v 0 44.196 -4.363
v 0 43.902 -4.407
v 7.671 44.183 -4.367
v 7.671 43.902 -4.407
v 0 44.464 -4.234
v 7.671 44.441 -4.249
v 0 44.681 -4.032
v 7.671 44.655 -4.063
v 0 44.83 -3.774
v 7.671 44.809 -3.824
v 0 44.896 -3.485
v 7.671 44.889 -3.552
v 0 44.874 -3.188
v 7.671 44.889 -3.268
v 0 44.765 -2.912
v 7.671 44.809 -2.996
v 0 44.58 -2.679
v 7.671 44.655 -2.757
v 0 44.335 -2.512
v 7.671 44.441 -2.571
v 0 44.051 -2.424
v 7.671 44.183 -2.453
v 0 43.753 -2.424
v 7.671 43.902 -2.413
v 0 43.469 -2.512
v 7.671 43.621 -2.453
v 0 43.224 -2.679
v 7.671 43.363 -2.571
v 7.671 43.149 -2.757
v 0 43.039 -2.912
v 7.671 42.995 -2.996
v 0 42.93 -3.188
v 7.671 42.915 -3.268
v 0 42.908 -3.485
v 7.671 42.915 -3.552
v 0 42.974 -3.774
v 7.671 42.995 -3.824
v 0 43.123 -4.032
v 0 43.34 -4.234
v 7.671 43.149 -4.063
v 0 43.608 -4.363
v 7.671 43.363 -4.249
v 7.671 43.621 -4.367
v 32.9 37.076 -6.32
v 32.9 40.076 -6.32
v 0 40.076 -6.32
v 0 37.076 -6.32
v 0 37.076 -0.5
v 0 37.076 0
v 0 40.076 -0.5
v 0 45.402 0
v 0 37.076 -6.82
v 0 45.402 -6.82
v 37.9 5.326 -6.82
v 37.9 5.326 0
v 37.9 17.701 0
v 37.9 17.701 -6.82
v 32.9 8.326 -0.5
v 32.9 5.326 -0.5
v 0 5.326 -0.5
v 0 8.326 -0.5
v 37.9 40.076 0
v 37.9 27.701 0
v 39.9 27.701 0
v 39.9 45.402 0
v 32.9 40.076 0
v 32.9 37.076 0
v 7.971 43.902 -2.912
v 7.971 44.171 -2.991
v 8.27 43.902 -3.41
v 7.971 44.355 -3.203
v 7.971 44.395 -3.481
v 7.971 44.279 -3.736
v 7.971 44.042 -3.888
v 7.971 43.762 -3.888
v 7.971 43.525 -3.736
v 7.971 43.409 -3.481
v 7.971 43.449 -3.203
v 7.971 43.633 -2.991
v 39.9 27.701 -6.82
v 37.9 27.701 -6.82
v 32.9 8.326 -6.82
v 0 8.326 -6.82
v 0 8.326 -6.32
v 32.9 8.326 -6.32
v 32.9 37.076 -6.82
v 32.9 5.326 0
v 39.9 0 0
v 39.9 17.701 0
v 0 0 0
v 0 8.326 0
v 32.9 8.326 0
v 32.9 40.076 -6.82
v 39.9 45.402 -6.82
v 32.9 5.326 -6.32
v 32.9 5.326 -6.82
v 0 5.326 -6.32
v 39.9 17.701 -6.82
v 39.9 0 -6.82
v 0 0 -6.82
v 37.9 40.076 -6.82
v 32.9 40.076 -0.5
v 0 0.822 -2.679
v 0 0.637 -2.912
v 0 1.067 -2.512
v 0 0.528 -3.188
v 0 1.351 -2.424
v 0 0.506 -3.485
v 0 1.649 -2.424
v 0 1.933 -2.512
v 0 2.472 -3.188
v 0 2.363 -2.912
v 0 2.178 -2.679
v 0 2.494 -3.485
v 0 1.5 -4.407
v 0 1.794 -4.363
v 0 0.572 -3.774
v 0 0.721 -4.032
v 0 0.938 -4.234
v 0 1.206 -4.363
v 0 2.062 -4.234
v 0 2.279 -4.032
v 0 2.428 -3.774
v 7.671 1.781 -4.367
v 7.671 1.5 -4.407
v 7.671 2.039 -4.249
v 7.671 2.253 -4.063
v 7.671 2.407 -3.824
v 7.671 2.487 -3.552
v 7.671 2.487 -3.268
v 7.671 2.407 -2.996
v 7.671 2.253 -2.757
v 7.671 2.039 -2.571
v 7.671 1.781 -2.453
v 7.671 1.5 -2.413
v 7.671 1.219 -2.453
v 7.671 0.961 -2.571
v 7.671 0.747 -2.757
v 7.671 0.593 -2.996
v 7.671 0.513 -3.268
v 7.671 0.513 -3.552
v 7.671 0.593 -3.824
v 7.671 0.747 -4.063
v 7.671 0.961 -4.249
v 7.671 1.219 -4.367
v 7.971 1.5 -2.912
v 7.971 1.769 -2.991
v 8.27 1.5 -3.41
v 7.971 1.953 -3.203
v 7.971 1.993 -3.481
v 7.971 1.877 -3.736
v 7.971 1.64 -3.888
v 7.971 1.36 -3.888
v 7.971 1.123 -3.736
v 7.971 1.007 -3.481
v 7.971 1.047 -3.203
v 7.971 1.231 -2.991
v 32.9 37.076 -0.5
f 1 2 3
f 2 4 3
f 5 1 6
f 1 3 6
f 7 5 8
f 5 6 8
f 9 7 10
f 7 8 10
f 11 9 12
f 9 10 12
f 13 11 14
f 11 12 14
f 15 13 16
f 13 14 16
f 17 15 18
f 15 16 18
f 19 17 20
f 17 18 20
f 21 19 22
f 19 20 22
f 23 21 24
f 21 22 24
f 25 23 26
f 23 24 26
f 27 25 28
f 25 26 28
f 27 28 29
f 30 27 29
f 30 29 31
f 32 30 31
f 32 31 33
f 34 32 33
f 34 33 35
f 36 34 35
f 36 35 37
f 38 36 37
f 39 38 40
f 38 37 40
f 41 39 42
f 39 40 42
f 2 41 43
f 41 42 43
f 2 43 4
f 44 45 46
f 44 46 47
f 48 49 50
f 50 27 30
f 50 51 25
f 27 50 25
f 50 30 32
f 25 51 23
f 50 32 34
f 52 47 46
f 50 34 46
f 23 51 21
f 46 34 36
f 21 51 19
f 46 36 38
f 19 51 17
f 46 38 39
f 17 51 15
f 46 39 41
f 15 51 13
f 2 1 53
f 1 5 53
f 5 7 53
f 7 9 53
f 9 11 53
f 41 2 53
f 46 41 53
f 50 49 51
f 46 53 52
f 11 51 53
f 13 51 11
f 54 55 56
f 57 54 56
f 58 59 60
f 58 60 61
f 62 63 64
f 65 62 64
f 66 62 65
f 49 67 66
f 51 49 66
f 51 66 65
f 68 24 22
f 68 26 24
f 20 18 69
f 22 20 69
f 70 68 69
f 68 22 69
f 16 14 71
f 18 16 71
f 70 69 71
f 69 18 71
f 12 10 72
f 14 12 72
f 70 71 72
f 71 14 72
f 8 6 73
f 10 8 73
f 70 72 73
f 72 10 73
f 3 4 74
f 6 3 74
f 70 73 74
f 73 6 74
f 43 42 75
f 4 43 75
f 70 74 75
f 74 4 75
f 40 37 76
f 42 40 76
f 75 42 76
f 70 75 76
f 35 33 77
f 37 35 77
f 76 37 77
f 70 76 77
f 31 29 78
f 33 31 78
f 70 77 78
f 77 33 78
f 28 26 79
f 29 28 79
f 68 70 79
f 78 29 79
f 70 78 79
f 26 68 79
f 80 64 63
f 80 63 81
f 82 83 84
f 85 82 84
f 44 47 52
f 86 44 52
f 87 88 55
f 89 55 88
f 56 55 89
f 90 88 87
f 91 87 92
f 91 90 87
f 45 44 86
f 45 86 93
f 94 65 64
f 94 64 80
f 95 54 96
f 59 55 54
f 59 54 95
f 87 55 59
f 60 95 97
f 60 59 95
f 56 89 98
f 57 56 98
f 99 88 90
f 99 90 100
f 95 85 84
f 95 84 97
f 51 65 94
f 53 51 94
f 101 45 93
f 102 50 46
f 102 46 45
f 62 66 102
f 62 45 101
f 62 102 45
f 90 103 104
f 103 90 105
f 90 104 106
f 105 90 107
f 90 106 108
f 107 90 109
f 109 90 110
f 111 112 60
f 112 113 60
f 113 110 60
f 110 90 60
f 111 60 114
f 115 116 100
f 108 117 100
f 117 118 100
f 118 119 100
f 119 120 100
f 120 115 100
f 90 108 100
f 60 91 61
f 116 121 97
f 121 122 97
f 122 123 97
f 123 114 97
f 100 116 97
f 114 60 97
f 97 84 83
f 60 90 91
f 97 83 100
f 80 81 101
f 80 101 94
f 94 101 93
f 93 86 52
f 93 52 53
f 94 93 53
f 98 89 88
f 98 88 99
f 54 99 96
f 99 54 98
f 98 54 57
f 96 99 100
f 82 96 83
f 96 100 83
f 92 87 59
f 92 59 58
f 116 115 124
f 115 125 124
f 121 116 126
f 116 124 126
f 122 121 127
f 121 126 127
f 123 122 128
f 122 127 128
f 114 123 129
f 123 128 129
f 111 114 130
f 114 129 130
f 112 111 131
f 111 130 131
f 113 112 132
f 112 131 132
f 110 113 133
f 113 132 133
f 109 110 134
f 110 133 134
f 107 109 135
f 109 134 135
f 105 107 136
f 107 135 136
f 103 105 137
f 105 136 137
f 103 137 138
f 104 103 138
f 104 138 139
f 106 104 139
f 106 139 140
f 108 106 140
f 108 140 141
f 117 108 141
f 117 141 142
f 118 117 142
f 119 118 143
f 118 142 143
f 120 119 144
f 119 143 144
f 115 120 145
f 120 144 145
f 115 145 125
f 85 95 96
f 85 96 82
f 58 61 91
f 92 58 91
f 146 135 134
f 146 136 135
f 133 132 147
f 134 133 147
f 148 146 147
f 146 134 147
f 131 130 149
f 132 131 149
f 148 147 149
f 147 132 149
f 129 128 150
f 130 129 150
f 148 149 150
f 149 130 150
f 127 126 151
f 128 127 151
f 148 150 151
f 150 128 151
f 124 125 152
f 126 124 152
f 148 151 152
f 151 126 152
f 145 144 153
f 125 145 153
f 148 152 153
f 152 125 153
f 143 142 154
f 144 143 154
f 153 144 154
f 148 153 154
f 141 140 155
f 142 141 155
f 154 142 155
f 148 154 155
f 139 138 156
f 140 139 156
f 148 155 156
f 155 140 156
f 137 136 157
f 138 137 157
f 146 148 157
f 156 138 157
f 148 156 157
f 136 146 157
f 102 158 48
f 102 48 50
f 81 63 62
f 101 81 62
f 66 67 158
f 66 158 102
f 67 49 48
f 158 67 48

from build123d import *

# Parameters (mm, degrees)
SKETCH1_W                 = 6.82
SKETCH1_H                 = 45.402
BOSS_EXTRUDE1_DEPTH       = 39.9
CUT_EXTRUDE1_DEPTH        = 35.9
CUT_EXTRUDE2_DEPTH        = 2
CUT_EXTRUDE4_DEPTH        = 7.82
F_3_48_TAPPED_HOLE1_D     = 1.9939
F_3_48_TAPPED_HOLE1_DEPTH = 7.671
F_3_48_TAPPED_HOLE1_TIP   = 0.599027994
CUT_EXTRUDE3_REACH        = 41.9
SKETCH6_W                 = 6.82
SKETCH6_H                 = 10


with BuildPart() as part:
    # Sketch1 → Boss-Extrude1 (new body)
    with BuildSketch(Plane(origin=(0, 0, 0), x_dir=(0, 0, -1), z_dir=(1, 0, 0))):
        with Locations((3.41, 22.701)):
            Rectangle(SKETCH1_W, SKETCH1_H)
    extrude(amount=BOSS_EXTRUDE1_DEPTH)

    # Sketch2 → Cut-Extrude1 (cut)
    with BuildSketch(Plane.ZY):
        Polygon((-6.32, 5.326), (-0.5, 5.326), (-0.5, 8.326), (0, 8.326), (0, 37.076), (-0.5, 37.076), (-0.5, 40.076), (-6.32, 40.076), (-6.32, 37.076), (-6.82, 37.076), (-6.82, 22.701), (-6.82, 8.326), (-6.32, 8.326), align=None)
    extrude(amount=-CUT_EXTRUDE1_DEPTH, mode=Mode.SUBTRACT)

    # Sketch3 → Cut-Extrude2 (cut)
    with BuildSketch(Plane.ZY.offset(-35.9)):
        Polygon((-6.32, 40.076), (-6.32, 37.076), (-6.82, 37.076), (-6.82, 8.326), (-6.32, 8.326), (-6.32, 5.326), (-0.5, 5.326), (-0.5, 8.326), (0, 8.326), (0, 37.076), (-0.5, 37.076), (-0.5, 40.076), align=None)
    extrude(amount=-CUT_EXTRUDE2_DEPTH, mode=Mode.SUBTRACT)

    # Sketch7 → Cut-Extrude4 (cut, through all)
    with BuildSketch(Plane.XY):
        Polygon((37.9, 37.076), (37.9, 8.326), (37.9, 5.326), (32.9, 5.326), (32.9, 40.076), (37.9, 40.076), align=None)
    extrude(amount=-CUT_EXTRUDE4_DEPTH, mode=Mode.SUBTRACT)

    # #3-48 Tapped Hole1
    with Locations(Plane.ZY):
        with Locations((-3.41, 1.5), (-3.41, 43.902)):
            Hole(F_3_48_TAPPED_HOLE1_D / 2, depth=F_3_48_TAPPED_HOLE1_DEPTH)
            with Locations((0, 0, -(F_3_48_TAPPED_HOLE1_DEPTH + F_3_48_TAPPED_HOLE1_TIP / 2))):  # 118° drill point
                Cone(0, F_3_48_TAPPED_HOLE1_D / 2, F_3_48_TAPPED_HOLE1_TIP, mode=Mode.SUBTRACT)

    # Sketch6 → Cut-Extrude3 (cut, up to next)
    with BuildSketch(Plane(origin=(39.9, 0, 0), x_dir=(0, 0, -1), z_dir=(1, 0, 0)), mode=Mode.PRIVATE) as cut_extrude3_sk1:
        with Locations((3.41, 22.701)):
            Rectangle(SKETCH6_W, SKETCH6_H)
    cut_extrude3_tool1 = extrude(cut_extrude3_sk1.sketch, amount=-CUT_EXTRUDE3_REACH, mode=Mode.PRIVATE) & part.part
    add(cut_extrude3_tool1.solids().sort_by_distance((39.9, 22.701, -3.41))[0], mode=Mode.SUBTRACT)


solid = part.part
